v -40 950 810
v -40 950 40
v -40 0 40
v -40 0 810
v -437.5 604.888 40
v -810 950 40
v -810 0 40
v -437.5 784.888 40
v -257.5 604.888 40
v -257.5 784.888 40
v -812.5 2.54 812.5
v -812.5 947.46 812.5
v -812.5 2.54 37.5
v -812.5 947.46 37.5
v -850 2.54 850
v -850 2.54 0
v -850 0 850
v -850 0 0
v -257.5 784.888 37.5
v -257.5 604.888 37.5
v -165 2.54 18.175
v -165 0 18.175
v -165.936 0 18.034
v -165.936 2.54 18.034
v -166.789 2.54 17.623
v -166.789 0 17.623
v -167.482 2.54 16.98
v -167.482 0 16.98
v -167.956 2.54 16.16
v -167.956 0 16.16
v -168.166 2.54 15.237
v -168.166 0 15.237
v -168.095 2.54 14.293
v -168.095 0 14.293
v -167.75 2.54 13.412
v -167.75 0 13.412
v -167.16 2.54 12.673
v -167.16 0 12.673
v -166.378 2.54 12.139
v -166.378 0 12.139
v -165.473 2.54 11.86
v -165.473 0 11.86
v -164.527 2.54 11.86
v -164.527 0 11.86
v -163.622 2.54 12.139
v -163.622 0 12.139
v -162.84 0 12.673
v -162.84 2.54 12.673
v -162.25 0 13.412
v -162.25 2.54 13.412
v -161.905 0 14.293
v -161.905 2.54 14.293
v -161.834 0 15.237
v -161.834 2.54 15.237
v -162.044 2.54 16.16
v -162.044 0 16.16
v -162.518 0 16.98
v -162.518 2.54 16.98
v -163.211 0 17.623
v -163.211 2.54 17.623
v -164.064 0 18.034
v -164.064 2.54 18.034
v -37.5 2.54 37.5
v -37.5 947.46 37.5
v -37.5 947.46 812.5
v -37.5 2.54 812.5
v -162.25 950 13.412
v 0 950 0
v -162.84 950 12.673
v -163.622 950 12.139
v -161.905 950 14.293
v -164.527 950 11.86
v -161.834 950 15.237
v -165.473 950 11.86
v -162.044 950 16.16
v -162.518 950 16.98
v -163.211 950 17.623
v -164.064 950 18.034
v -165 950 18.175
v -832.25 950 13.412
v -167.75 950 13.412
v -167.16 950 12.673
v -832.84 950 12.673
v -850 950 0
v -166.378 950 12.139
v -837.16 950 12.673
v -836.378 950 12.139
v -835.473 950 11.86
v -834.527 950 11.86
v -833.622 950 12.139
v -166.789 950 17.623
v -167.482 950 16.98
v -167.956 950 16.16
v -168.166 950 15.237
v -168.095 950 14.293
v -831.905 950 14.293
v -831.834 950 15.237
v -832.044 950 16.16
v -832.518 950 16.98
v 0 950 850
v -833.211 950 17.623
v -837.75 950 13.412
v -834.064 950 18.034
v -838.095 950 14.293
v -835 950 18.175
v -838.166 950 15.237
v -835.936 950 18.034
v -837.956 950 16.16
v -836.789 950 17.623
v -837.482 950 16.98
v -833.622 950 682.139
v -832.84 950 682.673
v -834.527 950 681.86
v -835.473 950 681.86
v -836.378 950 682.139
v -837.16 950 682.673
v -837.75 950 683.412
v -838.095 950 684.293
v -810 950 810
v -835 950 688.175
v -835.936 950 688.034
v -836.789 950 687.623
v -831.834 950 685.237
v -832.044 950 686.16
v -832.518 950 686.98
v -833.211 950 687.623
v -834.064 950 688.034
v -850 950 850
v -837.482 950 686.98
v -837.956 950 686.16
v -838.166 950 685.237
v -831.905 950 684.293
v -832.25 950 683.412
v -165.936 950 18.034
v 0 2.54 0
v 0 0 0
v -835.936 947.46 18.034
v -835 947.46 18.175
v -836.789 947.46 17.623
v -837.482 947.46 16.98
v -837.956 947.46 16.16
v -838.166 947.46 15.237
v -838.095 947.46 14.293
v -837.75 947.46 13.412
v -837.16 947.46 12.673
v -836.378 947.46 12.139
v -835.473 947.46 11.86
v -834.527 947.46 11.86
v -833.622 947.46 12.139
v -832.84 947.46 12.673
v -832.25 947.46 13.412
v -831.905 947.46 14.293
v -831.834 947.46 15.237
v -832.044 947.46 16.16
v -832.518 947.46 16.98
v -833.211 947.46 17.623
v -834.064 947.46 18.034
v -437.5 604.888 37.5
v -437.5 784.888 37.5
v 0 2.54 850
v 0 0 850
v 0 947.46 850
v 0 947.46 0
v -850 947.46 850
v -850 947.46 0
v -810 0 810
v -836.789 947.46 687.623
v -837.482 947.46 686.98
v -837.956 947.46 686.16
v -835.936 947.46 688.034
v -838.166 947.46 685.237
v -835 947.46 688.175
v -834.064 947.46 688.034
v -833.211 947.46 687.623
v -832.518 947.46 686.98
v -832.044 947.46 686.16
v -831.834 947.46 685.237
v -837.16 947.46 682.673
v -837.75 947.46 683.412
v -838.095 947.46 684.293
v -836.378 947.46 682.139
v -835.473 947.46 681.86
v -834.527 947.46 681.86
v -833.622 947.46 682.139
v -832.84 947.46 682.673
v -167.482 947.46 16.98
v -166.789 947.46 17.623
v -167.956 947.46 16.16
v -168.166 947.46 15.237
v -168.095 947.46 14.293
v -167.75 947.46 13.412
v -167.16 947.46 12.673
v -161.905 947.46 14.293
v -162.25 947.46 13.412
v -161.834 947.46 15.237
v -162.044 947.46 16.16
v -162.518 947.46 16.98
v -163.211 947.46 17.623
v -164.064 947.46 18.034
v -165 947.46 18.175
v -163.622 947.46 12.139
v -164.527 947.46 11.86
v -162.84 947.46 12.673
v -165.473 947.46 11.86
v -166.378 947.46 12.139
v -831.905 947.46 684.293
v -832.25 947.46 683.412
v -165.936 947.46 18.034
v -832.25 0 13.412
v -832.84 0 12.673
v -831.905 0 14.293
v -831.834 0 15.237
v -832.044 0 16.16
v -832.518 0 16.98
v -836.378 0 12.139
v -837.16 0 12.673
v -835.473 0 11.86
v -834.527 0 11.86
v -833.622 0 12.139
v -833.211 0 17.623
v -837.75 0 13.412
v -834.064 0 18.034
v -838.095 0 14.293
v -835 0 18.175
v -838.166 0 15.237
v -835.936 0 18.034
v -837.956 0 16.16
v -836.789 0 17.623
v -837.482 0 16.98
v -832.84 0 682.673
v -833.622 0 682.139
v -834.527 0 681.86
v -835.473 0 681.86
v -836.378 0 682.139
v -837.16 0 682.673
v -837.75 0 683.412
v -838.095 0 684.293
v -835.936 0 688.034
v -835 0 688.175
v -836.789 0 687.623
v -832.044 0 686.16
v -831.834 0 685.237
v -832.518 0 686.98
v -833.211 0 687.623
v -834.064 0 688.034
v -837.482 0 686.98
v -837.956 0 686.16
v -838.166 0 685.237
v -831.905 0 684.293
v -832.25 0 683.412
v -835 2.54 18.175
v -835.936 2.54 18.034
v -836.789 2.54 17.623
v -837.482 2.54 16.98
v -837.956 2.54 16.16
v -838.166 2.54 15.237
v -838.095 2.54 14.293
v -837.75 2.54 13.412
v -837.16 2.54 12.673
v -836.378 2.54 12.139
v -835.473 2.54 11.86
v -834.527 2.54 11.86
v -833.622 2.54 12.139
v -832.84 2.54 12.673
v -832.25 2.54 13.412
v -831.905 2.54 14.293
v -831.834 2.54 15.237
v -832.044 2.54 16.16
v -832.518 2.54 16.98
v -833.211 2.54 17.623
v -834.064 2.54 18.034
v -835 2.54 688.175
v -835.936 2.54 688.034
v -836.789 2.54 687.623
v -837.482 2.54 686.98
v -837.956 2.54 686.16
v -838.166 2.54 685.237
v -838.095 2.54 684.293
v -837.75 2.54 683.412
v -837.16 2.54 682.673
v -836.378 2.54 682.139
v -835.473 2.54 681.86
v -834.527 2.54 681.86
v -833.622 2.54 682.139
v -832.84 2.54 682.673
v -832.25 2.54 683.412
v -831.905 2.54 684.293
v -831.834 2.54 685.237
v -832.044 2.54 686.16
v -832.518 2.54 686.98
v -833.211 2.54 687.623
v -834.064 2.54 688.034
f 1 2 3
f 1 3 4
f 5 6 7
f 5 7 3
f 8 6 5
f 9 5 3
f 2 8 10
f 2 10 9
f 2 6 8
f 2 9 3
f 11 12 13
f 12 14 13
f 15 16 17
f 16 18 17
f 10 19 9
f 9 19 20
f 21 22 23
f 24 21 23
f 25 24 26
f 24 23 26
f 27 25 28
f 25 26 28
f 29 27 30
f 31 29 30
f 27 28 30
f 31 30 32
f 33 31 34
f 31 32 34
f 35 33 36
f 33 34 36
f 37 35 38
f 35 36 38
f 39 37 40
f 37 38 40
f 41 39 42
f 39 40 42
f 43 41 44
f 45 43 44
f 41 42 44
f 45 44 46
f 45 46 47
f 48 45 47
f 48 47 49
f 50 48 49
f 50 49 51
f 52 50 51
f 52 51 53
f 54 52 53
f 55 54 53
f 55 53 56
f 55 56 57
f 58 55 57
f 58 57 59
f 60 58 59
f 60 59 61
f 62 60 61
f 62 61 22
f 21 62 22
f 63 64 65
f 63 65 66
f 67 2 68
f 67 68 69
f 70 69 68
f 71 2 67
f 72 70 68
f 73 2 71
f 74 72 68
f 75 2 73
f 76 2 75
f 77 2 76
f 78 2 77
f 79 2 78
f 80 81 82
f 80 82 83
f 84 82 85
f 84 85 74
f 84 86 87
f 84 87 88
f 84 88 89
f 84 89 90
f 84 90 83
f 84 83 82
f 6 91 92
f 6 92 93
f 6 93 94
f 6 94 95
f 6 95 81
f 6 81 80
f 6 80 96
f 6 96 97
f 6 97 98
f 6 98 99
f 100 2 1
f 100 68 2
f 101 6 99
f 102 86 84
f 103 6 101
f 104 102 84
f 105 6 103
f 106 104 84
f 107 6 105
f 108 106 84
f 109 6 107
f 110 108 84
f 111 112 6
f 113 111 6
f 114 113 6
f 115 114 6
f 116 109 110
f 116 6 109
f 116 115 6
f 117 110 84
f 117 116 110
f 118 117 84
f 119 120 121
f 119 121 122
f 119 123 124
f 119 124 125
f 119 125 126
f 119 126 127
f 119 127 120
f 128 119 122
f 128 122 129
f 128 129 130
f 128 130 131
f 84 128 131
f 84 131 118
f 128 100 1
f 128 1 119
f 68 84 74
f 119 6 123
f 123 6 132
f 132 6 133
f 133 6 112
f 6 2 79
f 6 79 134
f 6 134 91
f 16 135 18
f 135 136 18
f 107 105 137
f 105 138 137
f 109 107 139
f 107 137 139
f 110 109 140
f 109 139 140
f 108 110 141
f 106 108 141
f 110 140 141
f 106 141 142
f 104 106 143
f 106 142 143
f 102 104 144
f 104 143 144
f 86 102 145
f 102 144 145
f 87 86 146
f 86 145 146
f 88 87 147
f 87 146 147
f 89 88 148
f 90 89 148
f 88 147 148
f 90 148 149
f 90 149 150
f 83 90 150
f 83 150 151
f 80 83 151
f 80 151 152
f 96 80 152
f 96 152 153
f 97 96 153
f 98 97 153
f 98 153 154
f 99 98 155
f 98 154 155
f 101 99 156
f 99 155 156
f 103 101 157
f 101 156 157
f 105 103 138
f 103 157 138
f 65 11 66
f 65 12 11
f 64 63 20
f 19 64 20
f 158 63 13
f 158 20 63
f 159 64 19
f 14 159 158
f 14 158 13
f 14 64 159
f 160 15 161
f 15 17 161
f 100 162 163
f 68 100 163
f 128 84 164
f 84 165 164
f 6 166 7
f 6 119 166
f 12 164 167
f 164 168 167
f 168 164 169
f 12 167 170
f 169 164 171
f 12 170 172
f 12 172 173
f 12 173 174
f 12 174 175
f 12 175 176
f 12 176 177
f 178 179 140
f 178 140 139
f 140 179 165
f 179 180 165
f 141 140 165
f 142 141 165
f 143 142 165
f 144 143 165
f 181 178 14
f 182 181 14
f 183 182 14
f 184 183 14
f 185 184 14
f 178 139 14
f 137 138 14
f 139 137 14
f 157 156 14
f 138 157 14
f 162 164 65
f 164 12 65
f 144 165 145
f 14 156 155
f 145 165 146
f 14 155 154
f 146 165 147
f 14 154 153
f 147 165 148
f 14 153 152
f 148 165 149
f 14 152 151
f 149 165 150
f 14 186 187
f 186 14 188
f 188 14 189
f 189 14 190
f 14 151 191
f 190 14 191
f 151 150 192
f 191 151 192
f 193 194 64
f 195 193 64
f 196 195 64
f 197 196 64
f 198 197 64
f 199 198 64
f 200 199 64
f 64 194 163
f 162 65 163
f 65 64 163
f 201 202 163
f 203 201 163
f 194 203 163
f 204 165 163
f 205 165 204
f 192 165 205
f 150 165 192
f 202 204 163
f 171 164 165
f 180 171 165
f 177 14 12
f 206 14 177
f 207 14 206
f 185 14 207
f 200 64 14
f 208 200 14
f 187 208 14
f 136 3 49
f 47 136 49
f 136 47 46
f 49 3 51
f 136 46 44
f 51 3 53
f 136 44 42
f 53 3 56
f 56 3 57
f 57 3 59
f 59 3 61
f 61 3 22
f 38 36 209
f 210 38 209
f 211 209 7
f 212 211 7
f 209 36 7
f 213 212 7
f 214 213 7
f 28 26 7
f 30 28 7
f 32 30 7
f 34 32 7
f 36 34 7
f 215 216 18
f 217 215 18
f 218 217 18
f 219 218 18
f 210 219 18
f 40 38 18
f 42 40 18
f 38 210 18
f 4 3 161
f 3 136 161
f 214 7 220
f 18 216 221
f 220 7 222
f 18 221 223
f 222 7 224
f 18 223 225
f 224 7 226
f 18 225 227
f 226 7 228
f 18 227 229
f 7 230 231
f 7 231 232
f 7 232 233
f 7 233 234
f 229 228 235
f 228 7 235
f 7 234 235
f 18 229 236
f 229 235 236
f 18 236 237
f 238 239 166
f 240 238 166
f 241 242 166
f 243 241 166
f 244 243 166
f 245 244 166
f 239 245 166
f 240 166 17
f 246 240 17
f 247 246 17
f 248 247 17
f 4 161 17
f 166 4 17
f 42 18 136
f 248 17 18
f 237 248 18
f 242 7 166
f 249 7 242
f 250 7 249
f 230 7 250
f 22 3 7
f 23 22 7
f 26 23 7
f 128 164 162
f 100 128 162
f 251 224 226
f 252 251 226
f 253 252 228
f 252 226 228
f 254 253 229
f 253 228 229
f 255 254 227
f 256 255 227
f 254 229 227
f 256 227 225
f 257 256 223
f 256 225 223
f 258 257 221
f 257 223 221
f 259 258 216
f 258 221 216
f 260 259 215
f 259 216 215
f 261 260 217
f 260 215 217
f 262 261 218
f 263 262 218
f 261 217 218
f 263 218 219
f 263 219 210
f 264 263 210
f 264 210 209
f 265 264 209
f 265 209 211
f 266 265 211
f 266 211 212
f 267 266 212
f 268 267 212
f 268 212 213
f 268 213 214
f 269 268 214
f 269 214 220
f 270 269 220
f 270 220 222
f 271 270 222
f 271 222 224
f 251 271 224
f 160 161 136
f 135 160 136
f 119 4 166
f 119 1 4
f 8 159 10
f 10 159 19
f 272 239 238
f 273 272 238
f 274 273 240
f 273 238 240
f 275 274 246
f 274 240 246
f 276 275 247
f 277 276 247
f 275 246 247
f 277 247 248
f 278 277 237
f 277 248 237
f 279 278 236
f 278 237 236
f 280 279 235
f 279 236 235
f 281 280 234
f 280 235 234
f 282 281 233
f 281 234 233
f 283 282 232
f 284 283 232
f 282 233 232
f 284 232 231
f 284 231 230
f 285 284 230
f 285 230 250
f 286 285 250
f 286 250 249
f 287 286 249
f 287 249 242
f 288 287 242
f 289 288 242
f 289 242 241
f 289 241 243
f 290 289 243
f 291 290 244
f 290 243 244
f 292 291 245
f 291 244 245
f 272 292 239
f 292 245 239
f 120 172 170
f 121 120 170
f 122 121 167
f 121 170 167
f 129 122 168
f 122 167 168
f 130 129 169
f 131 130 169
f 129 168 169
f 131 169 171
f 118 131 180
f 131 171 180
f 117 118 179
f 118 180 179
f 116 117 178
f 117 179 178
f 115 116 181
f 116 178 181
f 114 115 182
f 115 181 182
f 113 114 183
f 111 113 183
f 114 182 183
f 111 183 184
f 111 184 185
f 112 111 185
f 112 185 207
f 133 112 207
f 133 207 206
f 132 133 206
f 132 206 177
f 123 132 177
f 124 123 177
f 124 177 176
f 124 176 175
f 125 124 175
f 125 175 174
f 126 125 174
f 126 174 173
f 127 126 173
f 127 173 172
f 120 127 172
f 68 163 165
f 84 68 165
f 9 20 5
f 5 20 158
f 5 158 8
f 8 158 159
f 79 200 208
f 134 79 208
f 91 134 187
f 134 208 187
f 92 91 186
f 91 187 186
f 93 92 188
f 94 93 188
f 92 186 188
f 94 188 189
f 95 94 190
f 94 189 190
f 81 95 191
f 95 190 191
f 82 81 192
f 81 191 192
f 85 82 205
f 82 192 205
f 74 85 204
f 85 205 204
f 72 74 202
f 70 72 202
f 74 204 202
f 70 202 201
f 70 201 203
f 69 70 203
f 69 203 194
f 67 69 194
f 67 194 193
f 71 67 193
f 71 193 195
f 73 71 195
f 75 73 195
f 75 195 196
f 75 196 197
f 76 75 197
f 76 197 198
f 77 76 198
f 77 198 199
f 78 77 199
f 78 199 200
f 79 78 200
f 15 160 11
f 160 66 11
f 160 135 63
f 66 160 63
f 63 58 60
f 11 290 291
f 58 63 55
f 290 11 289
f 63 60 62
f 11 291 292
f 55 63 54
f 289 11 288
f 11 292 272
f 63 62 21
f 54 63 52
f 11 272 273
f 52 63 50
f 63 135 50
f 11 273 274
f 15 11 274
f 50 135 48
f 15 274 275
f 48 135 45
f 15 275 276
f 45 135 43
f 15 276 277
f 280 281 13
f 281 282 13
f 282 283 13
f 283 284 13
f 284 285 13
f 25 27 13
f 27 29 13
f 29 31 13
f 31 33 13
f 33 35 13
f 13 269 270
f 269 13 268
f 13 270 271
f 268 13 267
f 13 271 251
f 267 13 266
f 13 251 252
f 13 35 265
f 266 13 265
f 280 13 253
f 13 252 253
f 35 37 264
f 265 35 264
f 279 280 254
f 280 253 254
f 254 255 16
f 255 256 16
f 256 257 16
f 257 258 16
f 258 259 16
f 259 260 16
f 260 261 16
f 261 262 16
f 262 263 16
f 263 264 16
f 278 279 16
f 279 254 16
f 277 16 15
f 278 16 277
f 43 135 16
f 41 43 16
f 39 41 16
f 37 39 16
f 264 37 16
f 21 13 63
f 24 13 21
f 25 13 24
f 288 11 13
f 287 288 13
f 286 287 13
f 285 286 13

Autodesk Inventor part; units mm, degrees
ref_plane "YZ Plane" through (0, 0, 0) normal (1, 0, 0) x (0, 1, 0)
ref_plane "XZ Plane" through (0, 0, 0) normal (0, 1, 0) x (-1, 0, 0)
ref_plane "XY Plane" through (0, 0, 0) normal (0, 0, 1) x (1, 0, 0)
sketch "Sketch1" plane through (0, 0, 0) normal (0, 1, 0) x (-1, 0, 0)
  line L0 (0, 0) -> (850, 0)
  line L1 (850, 0) -> (850, 850)
  line L2 (850, 850) -> (0, 850)
  line L3 (0, 850) -> (0, 0)
  dimension "d0" = 850
  dimension "d1" = 850
extrude "Extrusion1" add sketch "Sketch1" along normal blind 950
sketch "Sketch2" plane through (0, 950, 0) normal (0, 1, 0) x (1, 0, 0)
  line L0 (0, 0) -> (-850, 0) projected
  line L1 (-850, 0) -> (-850, -850) projected
  line L2 (-850, -850) -> (0, -850) projected
  line L3 (0, -850) -> (0, 0) projected
  line L4 (-810, -40) -> (-40, -40)
  line L5 (-40, -40) -> (-40, -810)
  line L6 (-40, -810) -> (-810, -810)
  line L7 (-810, -810) -> (-810, -40)
  dimension "d4" = 40
extrude "Extrusion2" cut sketch "Sketch2" against normal blind 1000 contours L4 L5 L6 L7
sketch "Sketch3" plane through (-850, 0, 850) normal (0, 0, 1) x (1, 0, 0)
  line L0 (0, 0) -> (850, 0) projected
  line L1 (850, 0) -> (850, 950) projected
  line L2 (0, 950) -> (850, 950) projected
  line L3 (0, 0) -> (0, 950) projected
  line L4 (0, 2.54) -> (850, 2.54)
  line L5 (850, 2.54) -> (850, 947.46)
  line L6 (850, 947.46) -> (0, 947.46)
  line L7 (0, 947.46) -> (0, 2.54)
  dimension "d7" = 2.54
  dimension "d8" = 2.54
extrude "Extrusion3" cut sketch "Sketch3" against normal blind 37.5 contours L3 L6 L1 L4
sketch "Sketch4" plane through (0, 0, 0) normal (0, 0, -1) x (-1, 0, 0)
  line L0 (0, 0) -> (850, 0) projected
  line L1 (850, 0) -> (850, 950) projected
  line L2 (0, 950) -> (850, 950) projected
  line L3 (0, 0) -> (0, 950) projected
  line L4 (0, 2.54) -> (850, 2.54)
  line L5 (850, 2.54) -> (850, 947.46)
  line L6 (850, 947.46) -> (0, 947.46)
  line L7 (0, 947.46) -> (0, 2.54)
  dimension "d11" = 2.54
  dimension "d12" = 2.54
extrude "Extrusion4" cut sketch "Sketch4" against normal blind 37.5 contours L3 L6 L1 L4
sketch "Sketch5" plane through (0, 0, 37.5) normal (0, 0, -1) x (-1, 0, 0)
  line L0 (850, 2.54) -> (0, 2.54) projected
  line L1 (0, 947.46) -> (37.5, 947.46)
  line L2 (37.5, 947.46) -> (37.5, 2.54)
  line L3 (37.5, 2.54) -> (0, 2.54)
  line L4 (0, 2.54) -> (0, 947.46)
  line L5 (850, 947.46) -> (812.5, 947.46)
  line L6 (812.5, 947.46) -> (812.5, 2.54)
  line L7 (812.5, 2.54) -> (850, 2.54)
  line L8 (850, 2.54) -> (850, 947.46)
  point P0 (0, 0)
  dimension "d15" = 37.5
  dimension "d16" = 37.5
extrude "Extrusion5" cut sketch "Sketch5" against normal blind 1000
sketch "Sketch6" plane through (0, 950, 0) normal (0, 1, 0) x (1, 0, 0)
  line L0 (0, 0) -> (-850, 0) projected
  line L1 (-850, 0) -> (-850, -850) projected
  circle A0 centre (-835, -15) radius 5.0825
  point P0 (-165, -15)
  point P1 (-835, -685)
  point P2 (-165, -685)
  dimension "d19" = 15
  dimension "d20" = 15
  dimension "d23" = 670
  dimension "d26" = 670
hole "Hole1" at (-835, 950, 685) at (-835, 950, 15) at (-165, 950, 15) at (-165, 950, 685) direction (0, -1, 0) diameter 6.35 end through all
sketch "Sketch7" plane through (0, 0, 37.5) normal (0, 0, -1) x (-1, 0, 0)
  line L0 (37.5, 947.46) -> (37.5, 2.54) projected
  line L1 (257.5, 604.8881) -> (437.5, 604.8881)
  line L2 (437.5, 604.8881) -> (437.5, 784.8881)
  line L3 (437.5, 784.8881) -> (257.5, 784.8881)
  line L4 (257.5, 784.8881) -> (257.5, 604.8881)
  point P0 (0, 0)
  dimension "d36" = 220
  dimension "d37" = 180
  dimension "d38" = 180
extrude "Extrusion6" cut sketch "Sketch7" against normal blind 10
properties part number "housing" material "Aluminum 6061"
